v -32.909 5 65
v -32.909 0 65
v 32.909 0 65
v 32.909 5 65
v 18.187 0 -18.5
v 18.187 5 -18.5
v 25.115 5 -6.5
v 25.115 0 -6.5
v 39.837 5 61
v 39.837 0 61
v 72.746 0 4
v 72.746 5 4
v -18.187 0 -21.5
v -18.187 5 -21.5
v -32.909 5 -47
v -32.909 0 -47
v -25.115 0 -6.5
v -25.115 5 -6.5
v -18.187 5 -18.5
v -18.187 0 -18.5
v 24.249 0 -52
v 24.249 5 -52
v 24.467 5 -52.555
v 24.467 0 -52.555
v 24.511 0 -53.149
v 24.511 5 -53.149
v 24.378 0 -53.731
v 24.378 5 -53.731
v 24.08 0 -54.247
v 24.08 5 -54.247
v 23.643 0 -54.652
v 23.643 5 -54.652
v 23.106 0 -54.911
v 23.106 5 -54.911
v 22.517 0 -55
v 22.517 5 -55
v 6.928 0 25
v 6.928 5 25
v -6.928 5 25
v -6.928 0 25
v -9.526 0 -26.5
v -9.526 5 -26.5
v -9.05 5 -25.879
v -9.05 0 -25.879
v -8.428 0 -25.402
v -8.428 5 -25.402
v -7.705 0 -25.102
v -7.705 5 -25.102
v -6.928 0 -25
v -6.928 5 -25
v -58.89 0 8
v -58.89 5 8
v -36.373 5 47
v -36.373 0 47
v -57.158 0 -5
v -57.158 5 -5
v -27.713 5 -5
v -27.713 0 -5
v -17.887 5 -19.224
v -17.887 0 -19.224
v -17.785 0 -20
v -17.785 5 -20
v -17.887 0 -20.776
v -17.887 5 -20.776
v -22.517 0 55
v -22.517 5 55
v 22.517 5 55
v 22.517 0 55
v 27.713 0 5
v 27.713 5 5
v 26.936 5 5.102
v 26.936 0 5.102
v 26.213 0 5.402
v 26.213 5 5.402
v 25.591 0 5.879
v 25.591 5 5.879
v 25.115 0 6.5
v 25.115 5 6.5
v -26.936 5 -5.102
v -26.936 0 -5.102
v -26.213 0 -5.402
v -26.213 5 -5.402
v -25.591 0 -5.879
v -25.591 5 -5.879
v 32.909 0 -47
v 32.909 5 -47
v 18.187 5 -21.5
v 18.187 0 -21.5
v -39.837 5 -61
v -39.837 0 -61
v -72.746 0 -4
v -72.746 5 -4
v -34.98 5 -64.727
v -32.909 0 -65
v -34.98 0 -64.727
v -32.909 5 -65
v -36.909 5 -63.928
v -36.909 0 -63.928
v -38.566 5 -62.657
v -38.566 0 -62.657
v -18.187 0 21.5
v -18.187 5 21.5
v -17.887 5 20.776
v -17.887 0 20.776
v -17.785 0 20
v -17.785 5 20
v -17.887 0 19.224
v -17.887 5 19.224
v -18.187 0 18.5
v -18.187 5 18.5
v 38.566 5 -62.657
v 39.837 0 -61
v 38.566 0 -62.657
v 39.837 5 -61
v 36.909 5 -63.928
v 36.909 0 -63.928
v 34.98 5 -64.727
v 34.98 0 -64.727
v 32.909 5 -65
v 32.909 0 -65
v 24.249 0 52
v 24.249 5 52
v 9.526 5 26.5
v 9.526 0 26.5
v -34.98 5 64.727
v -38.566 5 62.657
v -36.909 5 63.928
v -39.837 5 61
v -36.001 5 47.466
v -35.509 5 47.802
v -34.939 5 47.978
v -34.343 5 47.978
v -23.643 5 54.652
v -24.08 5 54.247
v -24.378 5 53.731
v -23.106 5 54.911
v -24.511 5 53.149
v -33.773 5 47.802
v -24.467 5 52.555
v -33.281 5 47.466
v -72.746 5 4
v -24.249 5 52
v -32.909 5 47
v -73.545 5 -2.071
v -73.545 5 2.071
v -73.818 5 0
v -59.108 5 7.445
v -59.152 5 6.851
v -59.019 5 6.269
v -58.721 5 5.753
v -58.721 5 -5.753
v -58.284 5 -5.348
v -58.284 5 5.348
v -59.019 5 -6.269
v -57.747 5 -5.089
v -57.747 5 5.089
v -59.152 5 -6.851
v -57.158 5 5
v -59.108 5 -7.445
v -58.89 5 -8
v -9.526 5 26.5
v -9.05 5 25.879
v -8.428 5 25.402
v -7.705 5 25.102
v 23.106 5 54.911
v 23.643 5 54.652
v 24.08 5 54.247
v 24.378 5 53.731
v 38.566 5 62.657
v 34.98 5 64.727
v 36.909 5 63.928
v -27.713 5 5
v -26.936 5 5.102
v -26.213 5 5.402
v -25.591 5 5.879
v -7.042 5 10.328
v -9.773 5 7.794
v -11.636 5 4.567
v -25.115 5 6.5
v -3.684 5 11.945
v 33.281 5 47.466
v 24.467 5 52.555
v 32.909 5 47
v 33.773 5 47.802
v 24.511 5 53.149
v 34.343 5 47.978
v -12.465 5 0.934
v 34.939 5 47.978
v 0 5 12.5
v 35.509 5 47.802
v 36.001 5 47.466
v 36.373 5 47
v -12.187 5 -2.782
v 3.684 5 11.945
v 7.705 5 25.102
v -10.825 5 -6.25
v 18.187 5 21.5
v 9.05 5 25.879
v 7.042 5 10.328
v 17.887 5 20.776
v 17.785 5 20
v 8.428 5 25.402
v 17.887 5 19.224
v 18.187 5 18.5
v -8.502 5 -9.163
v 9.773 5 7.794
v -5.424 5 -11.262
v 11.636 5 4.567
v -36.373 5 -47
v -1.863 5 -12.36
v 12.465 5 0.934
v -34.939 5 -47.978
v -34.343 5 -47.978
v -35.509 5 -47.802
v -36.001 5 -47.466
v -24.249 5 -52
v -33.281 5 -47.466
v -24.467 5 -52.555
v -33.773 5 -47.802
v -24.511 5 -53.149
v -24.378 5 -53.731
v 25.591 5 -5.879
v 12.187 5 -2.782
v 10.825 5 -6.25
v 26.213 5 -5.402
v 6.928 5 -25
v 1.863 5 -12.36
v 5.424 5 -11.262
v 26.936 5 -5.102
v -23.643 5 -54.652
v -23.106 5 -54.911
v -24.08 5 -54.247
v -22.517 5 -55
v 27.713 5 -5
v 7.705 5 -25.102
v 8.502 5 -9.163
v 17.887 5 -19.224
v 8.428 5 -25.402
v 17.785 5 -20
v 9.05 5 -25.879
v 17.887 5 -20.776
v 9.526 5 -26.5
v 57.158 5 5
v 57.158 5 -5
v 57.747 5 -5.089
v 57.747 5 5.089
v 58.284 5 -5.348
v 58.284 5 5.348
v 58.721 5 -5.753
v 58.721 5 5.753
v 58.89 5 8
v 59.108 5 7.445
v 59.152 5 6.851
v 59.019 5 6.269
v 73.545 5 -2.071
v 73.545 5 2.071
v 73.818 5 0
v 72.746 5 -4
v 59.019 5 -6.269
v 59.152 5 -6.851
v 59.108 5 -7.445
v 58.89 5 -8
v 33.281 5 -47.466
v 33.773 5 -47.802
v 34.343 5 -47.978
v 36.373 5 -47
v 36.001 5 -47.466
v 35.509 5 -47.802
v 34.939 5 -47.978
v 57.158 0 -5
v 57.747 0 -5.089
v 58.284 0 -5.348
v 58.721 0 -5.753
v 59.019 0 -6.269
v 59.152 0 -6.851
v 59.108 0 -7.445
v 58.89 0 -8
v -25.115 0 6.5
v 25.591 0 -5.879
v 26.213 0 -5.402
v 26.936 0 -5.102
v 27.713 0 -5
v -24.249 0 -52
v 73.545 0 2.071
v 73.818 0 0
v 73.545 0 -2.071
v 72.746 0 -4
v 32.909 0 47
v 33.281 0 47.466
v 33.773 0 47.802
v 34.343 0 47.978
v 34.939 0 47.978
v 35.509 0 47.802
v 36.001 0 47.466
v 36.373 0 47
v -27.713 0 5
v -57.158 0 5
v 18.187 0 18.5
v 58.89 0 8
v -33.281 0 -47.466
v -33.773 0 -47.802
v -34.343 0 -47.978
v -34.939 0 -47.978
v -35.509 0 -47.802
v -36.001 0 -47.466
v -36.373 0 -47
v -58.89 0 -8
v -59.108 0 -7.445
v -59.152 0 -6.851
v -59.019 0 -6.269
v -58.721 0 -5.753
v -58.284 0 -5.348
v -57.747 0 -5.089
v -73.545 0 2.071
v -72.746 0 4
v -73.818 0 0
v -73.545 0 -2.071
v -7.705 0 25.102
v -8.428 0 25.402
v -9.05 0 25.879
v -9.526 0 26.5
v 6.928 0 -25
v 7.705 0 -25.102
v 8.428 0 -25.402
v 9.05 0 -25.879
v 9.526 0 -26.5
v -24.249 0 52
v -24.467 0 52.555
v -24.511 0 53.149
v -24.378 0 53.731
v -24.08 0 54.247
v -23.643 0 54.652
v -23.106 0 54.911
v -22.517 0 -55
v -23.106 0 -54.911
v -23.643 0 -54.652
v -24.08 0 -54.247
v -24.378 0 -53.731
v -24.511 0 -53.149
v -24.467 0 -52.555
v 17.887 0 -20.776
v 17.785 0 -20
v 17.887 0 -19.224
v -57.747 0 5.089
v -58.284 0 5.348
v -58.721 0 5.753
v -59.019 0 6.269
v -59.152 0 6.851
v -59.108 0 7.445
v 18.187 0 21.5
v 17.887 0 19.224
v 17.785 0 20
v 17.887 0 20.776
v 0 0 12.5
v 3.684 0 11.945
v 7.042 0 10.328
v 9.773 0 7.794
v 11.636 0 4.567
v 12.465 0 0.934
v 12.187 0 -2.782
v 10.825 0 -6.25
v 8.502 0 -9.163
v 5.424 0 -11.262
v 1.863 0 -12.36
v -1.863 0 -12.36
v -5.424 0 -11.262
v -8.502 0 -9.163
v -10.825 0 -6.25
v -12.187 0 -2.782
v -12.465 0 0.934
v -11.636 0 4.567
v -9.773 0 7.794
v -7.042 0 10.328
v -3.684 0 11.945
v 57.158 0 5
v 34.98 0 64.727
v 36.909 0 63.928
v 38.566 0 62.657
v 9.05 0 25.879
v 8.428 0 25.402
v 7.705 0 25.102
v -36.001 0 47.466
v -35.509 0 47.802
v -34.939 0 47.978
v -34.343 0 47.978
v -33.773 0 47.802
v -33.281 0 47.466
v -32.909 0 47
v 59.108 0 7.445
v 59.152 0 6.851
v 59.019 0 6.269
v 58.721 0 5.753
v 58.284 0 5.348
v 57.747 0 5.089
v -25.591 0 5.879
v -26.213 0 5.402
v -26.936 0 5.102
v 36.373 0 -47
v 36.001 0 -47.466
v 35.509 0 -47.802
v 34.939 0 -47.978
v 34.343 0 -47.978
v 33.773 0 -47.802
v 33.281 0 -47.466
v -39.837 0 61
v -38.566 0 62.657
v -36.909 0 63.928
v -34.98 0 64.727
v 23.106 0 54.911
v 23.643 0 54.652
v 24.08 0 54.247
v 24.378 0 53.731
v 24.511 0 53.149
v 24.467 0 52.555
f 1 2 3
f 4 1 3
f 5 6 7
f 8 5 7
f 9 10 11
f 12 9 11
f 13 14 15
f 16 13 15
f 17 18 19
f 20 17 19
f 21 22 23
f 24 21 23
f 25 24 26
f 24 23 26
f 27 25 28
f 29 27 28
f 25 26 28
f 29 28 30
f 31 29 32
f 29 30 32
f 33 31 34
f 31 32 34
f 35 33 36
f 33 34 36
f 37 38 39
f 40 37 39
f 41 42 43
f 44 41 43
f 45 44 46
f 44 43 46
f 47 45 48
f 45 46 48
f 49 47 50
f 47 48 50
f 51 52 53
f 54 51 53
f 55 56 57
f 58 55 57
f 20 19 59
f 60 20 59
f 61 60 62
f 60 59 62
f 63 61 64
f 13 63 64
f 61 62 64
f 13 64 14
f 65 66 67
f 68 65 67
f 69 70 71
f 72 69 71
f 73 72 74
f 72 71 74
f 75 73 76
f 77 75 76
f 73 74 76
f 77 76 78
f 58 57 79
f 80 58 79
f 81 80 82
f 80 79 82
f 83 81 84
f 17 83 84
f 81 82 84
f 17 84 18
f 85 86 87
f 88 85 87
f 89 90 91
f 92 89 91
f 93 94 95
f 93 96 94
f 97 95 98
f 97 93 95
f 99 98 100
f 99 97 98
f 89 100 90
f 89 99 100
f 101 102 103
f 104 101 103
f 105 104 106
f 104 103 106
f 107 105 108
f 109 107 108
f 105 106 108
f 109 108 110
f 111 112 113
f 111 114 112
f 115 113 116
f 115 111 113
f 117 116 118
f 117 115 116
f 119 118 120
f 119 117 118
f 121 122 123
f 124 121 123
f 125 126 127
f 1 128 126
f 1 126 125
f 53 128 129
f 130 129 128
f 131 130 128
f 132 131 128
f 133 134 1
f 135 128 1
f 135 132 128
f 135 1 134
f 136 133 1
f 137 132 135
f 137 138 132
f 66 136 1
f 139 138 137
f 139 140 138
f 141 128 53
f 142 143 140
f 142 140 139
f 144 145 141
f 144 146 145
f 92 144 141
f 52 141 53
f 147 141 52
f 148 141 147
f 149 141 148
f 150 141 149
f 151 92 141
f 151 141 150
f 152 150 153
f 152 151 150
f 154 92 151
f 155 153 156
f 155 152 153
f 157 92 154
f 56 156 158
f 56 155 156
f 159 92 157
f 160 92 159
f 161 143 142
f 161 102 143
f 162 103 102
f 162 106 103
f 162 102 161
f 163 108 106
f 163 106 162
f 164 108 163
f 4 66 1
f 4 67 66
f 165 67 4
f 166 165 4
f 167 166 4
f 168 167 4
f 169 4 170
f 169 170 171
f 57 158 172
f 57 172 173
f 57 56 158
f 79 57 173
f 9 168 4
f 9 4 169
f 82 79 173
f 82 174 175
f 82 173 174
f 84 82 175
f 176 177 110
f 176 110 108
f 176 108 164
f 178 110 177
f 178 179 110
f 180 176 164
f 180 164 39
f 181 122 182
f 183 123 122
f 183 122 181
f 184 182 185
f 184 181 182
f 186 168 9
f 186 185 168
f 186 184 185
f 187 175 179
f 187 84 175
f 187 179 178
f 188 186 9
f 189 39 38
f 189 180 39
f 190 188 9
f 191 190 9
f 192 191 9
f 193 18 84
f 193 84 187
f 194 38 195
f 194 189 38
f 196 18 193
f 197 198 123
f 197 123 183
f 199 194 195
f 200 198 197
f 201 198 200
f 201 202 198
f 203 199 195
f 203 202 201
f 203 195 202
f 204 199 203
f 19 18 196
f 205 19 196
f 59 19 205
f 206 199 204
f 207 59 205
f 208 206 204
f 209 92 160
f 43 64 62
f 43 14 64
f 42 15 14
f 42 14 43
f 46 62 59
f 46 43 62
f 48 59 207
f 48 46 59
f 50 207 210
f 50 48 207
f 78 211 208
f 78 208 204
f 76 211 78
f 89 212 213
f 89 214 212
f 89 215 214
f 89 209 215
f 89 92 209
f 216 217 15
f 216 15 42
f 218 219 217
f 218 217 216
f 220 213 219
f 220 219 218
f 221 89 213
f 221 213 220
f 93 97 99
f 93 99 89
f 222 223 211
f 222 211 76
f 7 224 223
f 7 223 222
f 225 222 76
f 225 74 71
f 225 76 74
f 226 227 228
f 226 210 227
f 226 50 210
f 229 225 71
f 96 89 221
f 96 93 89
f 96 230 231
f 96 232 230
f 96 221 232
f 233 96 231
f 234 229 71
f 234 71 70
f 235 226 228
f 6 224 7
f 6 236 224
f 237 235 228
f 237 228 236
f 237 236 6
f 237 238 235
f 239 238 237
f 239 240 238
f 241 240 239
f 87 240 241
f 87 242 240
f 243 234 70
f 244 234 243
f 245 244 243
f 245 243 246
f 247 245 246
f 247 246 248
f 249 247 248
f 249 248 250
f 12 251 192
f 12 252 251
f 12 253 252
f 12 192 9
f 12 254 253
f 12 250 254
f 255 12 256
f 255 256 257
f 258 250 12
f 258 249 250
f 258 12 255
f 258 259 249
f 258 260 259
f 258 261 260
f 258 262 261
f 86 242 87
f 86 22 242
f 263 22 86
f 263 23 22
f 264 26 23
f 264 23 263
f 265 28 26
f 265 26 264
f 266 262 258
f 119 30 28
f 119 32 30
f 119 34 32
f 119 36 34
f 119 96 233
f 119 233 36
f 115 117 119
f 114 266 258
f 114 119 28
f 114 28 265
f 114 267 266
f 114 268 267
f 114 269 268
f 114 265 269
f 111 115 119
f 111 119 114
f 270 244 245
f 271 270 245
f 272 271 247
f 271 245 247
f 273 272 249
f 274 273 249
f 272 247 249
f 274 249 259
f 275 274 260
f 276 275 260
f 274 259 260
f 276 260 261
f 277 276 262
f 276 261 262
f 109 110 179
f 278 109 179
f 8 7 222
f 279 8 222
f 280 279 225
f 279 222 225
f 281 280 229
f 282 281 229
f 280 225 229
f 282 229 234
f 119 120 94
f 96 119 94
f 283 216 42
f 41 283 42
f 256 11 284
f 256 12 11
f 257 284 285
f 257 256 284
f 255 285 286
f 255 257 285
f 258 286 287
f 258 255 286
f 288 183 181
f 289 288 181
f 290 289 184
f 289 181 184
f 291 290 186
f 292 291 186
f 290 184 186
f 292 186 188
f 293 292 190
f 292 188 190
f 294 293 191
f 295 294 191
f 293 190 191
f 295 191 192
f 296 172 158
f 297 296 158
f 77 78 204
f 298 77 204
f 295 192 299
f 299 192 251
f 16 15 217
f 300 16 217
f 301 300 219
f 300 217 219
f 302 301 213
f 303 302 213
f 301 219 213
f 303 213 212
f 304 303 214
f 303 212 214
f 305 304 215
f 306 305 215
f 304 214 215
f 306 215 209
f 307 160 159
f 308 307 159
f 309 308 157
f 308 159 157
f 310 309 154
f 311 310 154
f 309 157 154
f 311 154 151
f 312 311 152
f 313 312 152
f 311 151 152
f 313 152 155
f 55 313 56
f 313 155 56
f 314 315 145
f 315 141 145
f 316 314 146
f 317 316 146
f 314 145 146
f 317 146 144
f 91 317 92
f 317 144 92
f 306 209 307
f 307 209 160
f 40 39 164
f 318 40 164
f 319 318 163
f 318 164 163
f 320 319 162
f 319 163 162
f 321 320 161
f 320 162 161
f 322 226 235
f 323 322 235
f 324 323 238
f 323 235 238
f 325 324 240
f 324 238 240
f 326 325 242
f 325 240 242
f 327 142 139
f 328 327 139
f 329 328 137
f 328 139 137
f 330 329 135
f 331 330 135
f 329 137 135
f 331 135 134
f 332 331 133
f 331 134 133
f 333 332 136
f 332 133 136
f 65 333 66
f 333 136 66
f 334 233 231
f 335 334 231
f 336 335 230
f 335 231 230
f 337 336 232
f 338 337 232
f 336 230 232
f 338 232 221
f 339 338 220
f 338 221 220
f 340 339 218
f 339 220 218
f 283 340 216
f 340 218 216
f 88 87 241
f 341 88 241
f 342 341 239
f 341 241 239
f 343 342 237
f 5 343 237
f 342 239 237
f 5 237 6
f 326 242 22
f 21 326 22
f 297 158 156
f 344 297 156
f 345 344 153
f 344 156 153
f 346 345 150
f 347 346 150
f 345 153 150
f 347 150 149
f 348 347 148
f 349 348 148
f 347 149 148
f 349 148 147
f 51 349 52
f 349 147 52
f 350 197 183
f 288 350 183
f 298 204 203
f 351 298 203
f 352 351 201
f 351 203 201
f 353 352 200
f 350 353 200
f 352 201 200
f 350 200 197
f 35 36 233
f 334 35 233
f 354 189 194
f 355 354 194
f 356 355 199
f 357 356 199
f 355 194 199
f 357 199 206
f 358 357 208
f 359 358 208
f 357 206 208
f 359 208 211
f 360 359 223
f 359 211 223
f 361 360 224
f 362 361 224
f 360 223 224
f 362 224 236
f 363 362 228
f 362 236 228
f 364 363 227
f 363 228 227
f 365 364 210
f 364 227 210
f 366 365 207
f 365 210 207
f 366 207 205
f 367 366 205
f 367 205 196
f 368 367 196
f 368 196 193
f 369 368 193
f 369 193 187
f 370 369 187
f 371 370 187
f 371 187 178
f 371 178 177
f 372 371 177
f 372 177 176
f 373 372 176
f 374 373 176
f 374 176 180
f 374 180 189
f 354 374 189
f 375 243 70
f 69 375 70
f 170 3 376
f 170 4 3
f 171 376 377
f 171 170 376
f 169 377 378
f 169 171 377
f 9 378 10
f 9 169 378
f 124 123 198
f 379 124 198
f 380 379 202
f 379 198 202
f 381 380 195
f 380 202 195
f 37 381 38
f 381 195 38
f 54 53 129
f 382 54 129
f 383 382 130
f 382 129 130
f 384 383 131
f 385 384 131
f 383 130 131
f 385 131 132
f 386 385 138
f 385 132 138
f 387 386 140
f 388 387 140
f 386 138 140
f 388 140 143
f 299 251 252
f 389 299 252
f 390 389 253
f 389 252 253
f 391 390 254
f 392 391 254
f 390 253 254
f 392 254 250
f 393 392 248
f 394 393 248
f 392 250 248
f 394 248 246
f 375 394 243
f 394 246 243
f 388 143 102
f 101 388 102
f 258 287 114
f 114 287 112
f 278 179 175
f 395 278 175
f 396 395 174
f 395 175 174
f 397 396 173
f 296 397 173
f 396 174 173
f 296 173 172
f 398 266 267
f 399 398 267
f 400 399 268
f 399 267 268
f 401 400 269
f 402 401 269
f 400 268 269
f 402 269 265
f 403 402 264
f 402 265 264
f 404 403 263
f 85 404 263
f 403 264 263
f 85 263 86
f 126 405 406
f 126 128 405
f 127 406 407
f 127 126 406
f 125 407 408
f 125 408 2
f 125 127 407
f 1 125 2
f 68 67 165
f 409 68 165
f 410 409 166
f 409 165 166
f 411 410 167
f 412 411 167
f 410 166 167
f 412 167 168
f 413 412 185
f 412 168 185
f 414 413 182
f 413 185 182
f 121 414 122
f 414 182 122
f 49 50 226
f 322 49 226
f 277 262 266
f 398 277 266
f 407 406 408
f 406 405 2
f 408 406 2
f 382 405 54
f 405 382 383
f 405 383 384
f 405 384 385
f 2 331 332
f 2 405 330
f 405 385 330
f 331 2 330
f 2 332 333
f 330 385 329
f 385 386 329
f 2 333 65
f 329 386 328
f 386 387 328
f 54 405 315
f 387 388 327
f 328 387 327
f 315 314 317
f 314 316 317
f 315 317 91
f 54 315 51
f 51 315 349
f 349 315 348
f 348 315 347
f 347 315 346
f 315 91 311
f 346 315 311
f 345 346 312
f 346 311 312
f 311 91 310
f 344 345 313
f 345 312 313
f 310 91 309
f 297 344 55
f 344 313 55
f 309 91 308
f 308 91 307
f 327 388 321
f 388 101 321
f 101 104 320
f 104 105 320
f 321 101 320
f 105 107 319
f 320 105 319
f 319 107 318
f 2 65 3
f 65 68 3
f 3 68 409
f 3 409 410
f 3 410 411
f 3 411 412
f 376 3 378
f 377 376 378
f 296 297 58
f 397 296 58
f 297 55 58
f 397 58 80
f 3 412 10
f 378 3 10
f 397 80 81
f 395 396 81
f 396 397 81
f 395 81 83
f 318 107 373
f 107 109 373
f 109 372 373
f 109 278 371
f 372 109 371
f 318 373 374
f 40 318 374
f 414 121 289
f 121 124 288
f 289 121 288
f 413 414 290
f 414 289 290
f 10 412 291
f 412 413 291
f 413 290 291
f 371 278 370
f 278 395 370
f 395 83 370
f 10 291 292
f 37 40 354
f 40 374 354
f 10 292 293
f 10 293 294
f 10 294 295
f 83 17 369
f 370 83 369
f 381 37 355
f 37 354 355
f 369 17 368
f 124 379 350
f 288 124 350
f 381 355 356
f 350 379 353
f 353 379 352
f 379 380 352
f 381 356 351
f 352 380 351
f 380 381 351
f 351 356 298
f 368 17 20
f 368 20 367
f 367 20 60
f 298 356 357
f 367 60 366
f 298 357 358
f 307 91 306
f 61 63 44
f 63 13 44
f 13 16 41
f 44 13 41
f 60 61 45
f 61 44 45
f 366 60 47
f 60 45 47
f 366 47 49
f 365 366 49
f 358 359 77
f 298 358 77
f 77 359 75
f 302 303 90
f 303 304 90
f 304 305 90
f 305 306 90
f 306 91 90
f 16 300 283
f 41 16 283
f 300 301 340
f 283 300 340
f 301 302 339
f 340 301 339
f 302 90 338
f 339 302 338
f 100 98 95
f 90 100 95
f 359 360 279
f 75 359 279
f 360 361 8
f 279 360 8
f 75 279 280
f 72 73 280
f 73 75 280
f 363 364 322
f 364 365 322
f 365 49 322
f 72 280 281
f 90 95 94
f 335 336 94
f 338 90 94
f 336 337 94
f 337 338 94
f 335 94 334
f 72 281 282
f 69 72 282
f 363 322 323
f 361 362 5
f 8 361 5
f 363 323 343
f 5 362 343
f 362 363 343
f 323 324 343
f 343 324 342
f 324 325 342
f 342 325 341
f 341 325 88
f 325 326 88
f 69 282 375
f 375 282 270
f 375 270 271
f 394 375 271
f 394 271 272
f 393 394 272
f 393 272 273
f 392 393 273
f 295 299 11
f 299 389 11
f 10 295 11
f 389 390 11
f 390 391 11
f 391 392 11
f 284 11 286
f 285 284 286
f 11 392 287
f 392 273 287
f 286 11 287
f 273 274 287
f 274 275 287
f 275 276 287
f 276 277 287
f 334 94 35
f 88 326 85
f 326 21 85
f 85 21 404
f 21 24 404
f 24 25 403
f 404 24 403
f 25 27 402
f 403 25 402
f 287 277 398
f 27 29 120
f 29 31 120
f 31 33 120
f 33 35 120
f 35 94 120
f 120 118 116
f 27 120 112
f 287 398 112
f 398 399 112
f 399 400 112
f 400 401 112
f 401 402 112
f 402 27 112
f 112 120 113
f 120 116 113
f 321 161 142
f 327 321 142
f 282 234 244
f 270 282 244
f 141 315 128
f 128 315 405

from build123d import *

# Parameters (mm, degrees)
BOSS_EXTRUDE1_DEPTH = 5
FILLET1_R           = 8
SKETCH2_R           = 12.5
CUT_EXTRUDE1_DEPTH  = 10


with BuildPart() as part:
    # Sketch1 → Boss-Extrude1 (new body)
    with BuildSketch(Plane(origin=(0, 0, 0), x_dir=(1, 0, 0), z_dir=(0, 1, 0))):
        Polygon((-75.055534995, 0), (-37.527767497, -65), (37.527767497, -65), (75.055534995, 0), (37.527767497, 65), (-37.527767497, 65), align=None)
    extrude(amount=BOSS_EXTRUDE1_DEPTH)

    # Fillet1
    fillet1_edges = [part.edges().sort_by_distance(p)[0] for p in [
        (-37.527767497, 2.5, -65),
        (37.527767497, 2.5, -65),
        (75.055534995, 2.5, 0),
        (37.527767497, 2.5, 65),
        (-37.527767497, 2.5, 65),
        (-75.055534995, 2.5, 0),
    ]]
    fillet(fillet1_edges, radius=FILLET1_R)

    # Sketch2 → Cut-Extrude1 (cut)
    with BuildSketch(Plane(origin=(0, 5, 0), x_dir=(1, 0, 0), z_dir=(0, 1, 0))):
        with Locations(Location((0, 0, 0), (0, 0, 270))):
            Circle(SKETCH2_R)
        with BuildLine():
            Line((9.526279442, 26.5), (24.248711306, 52))
            ThreePointArc((24.248711306, 52), (24.248711306, 54), (22.516660498, 55))
            Line((22.516660498, 55), (-22.516660498, 55))
            ThreePointArc((-22.516660498, 55), (-24.248711306, 54), (-24.248711306, 52))
            Line((-24.248711306, 52), (-9.526279442, 26.5))
            ThreePointArc((-9.526279442, 26.5), (-8.42820323, 25.401923789), (-6.92820323, 25))
            Line((-6.92820323, 25), (6.92820323, 25))
            ThreePointArc((6.92820323, 25), (8.42820323, 25.401923789), (9.526279442, 26.5))
        make_face()
        with BuildLine():
            Line((27.712812921, 5), (57.15767665, 5))
            ThreePointArc((57.15767665, 5), (58.889727457, 6), (58.889727457, 8))
            Line((58.889727457, 8), (36.373066959, 47))
            ThreePointArc((36.373066959, 47), (34.641016151, 48), (32.908965344, 47))
            Line((32.908965344, 47), (18.186533479, 21.5))
            ThreePointArc((18.186533479, 21.5), (17.784609691, 20), (18.186533479, 18.5))
            Line((18.186533479, 18.5), (25.11473671, 6.5))
            ThreePointArc((25.11473671, 6.5), (26.212812921, 5.401923789), (27.712812921, 5))
        make_face()
        with BuildLine():
            Line((18.186533479, -21.5), (32.908965344, -47))
            ThreePointArc((32.908965344, -47), (34.641016151, -48), (36.373066959, -47))
            Line((36.373066959, -47), (58.889727457, -8))
            ThreePointArc((58.889727457, -8), (58.889727457, -6), (57.15767665, -5))
            Line((57.15767665, -5), (27.712812921, -5))
            ThreePointArc((27.712812921, -5), (26.212812921, -5.401923789), (25.11473671, -6.5))
            Line((25.11473671, -6.5), (18.186533479, -18.5))
            ThreePointArc((18.186533479, -18.5), (17.784609691, -20), (18.186533479, -21.5))
        make_face()
        with BuildLine():
            Line((-9.526279442, -26.5), (-24.248711306, -52))
            ThreePointArc((-24.248711306, -52), (-24.248711306, -54), (-22.516660498, -55))
            Line((-22.516660498, -55), (22.516660498, -55))
            ThreePointArc((22.516660498, -55), (24.248711306, -54), (24.248711306, -52))
            Line((24.248711306, -52), (9.526279442, -26.5))
            ThreePointArc((9.526279442, -26.5), (8.42820323, -25.401923789), (6.92820323, -25))
            Line((6.92820323, -25), (-6.92820323, -25))
            ThreePointArc((-6.92820323, -25), (-8.42820323, -25.401923789), (-9.526279442, -26.5))
        make_face()
        with BuildLine():
            Line((-27.712812921, -5), (-57.15767665, -5))
            ThreePointArc((-57.15767665, -5), (-58.889727457, -6), (-58.889727457, -8))
            Line((-58.889727457, -8), (-36.373066959, -47))
            ThreePointArc((-36.373066959, -47), (-34.641016151, -48), (-32.908965344, -47))
            Line((-32.908965344, -47), (-18.186533479, -21.5))
            ThreePointArc((-18.186533479, -21.5), (-17.784609691, -20), (-18.186533479, -18.5))
            Line((-18.186533479, -18.5), (-25.11473671, -6.5))
            ThreePointArc((-25.11473671, -6.5), (-26.212812921, -5.401923789), (-27.712812921, -5))
        make_face()
        with BuildLine():
            Line((-18.186533479, 21.5), (-32.908965344, 47))
            ThreePointArc((-32.908965344, 47), (-34.641016151, 48), (-36.373066959, 47))
            Line((-36.373066959, 47), (-58.889727457, 8))
            ThreePointArc((-58.889727457, 8), (-58.889727457, 6), (-57.15767665, 5))
            Line((-57.15767665, 5), (-27.712812921, 5))
            ThreePointArc((-27.712812921, 5), (-26.212812921, 5.401923789), (-25.11473671, 6.5))
            Line((-25.11473671, 6.5), (-18.186533479, 18.5))
            ThreePointArc((-18.186533479, 18.5), (-17.784609691, 20), (-18.186533479, 21.5))
        make_face()
    extrude(amount=-CUT_EXTRUDE1_DEPTH, mode=Mode.SUBTRACT)


solid = part.part
